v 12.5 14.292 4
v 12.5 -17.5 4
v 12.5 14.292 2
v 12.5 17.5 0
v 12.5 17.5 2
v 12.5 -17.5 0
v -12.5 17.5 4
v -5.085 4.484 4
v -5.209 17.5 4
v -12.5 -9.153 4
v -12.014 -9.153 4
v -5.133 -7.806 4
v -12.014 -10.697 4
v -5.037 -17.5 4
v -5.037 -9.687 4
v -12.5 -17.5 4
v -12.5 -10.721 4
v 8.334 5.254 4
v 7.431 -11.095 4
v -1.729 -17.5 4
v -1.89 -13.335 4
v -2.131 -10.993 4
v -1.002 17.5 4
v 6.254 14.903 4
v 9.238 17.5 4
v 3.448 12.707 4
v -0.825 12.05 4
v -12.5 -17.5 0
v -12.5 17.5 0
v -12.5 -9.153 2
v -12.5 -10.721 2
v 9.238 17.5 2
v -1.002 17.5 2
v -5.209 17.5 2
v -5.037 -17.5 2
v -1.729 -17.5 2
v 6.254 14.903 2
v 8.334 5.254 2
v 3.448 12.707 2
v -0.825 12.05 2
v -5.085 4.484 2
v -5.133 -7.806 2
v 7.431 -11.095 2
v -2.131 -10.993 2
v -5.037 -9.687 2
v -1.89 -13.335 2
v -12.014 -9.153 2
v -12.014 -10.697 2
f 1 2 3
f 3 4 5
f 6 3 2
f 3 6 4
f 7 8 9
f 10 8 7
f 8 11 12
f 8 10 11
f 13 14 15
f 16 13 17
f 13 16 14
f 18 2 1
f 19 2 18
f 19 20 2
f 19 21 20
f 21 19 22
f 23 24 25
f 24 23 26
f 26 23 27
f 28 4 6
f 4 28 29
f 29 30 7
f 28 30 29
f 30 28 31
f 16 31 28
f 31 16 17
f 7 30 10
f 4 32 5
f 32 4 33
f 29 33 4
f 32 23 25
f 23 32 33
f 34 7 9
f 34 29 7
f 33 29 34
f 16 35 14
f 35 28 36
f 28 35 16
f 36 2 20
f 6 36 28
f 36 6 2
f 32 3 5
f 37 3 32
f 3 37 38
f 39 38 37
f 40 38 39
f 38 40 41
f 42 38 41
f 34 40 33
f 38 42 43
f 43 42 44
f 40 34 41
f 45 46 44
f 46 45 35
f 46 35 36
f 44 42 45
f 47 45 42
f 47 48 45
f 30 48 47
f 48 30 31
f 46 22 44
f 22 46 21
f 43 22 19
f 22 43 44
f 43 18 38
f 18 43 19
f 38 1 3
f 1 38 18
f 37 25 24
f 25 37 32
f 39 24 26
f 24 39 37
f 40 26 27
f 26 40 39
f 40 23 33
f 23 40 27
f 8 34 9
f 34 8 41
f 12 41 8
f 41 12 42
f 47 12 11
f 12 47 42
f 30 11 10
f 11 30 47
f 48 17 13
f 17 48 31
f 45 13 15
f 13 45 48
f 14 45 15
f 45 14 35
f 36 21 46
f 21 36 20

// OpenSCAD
difference() {
translate([0,0,2]) cube([25,35,4],center=true); 
translate([-3,-1,2]) scale(0.3) linear_extrude(height = 40) import("test4.dxf");}
